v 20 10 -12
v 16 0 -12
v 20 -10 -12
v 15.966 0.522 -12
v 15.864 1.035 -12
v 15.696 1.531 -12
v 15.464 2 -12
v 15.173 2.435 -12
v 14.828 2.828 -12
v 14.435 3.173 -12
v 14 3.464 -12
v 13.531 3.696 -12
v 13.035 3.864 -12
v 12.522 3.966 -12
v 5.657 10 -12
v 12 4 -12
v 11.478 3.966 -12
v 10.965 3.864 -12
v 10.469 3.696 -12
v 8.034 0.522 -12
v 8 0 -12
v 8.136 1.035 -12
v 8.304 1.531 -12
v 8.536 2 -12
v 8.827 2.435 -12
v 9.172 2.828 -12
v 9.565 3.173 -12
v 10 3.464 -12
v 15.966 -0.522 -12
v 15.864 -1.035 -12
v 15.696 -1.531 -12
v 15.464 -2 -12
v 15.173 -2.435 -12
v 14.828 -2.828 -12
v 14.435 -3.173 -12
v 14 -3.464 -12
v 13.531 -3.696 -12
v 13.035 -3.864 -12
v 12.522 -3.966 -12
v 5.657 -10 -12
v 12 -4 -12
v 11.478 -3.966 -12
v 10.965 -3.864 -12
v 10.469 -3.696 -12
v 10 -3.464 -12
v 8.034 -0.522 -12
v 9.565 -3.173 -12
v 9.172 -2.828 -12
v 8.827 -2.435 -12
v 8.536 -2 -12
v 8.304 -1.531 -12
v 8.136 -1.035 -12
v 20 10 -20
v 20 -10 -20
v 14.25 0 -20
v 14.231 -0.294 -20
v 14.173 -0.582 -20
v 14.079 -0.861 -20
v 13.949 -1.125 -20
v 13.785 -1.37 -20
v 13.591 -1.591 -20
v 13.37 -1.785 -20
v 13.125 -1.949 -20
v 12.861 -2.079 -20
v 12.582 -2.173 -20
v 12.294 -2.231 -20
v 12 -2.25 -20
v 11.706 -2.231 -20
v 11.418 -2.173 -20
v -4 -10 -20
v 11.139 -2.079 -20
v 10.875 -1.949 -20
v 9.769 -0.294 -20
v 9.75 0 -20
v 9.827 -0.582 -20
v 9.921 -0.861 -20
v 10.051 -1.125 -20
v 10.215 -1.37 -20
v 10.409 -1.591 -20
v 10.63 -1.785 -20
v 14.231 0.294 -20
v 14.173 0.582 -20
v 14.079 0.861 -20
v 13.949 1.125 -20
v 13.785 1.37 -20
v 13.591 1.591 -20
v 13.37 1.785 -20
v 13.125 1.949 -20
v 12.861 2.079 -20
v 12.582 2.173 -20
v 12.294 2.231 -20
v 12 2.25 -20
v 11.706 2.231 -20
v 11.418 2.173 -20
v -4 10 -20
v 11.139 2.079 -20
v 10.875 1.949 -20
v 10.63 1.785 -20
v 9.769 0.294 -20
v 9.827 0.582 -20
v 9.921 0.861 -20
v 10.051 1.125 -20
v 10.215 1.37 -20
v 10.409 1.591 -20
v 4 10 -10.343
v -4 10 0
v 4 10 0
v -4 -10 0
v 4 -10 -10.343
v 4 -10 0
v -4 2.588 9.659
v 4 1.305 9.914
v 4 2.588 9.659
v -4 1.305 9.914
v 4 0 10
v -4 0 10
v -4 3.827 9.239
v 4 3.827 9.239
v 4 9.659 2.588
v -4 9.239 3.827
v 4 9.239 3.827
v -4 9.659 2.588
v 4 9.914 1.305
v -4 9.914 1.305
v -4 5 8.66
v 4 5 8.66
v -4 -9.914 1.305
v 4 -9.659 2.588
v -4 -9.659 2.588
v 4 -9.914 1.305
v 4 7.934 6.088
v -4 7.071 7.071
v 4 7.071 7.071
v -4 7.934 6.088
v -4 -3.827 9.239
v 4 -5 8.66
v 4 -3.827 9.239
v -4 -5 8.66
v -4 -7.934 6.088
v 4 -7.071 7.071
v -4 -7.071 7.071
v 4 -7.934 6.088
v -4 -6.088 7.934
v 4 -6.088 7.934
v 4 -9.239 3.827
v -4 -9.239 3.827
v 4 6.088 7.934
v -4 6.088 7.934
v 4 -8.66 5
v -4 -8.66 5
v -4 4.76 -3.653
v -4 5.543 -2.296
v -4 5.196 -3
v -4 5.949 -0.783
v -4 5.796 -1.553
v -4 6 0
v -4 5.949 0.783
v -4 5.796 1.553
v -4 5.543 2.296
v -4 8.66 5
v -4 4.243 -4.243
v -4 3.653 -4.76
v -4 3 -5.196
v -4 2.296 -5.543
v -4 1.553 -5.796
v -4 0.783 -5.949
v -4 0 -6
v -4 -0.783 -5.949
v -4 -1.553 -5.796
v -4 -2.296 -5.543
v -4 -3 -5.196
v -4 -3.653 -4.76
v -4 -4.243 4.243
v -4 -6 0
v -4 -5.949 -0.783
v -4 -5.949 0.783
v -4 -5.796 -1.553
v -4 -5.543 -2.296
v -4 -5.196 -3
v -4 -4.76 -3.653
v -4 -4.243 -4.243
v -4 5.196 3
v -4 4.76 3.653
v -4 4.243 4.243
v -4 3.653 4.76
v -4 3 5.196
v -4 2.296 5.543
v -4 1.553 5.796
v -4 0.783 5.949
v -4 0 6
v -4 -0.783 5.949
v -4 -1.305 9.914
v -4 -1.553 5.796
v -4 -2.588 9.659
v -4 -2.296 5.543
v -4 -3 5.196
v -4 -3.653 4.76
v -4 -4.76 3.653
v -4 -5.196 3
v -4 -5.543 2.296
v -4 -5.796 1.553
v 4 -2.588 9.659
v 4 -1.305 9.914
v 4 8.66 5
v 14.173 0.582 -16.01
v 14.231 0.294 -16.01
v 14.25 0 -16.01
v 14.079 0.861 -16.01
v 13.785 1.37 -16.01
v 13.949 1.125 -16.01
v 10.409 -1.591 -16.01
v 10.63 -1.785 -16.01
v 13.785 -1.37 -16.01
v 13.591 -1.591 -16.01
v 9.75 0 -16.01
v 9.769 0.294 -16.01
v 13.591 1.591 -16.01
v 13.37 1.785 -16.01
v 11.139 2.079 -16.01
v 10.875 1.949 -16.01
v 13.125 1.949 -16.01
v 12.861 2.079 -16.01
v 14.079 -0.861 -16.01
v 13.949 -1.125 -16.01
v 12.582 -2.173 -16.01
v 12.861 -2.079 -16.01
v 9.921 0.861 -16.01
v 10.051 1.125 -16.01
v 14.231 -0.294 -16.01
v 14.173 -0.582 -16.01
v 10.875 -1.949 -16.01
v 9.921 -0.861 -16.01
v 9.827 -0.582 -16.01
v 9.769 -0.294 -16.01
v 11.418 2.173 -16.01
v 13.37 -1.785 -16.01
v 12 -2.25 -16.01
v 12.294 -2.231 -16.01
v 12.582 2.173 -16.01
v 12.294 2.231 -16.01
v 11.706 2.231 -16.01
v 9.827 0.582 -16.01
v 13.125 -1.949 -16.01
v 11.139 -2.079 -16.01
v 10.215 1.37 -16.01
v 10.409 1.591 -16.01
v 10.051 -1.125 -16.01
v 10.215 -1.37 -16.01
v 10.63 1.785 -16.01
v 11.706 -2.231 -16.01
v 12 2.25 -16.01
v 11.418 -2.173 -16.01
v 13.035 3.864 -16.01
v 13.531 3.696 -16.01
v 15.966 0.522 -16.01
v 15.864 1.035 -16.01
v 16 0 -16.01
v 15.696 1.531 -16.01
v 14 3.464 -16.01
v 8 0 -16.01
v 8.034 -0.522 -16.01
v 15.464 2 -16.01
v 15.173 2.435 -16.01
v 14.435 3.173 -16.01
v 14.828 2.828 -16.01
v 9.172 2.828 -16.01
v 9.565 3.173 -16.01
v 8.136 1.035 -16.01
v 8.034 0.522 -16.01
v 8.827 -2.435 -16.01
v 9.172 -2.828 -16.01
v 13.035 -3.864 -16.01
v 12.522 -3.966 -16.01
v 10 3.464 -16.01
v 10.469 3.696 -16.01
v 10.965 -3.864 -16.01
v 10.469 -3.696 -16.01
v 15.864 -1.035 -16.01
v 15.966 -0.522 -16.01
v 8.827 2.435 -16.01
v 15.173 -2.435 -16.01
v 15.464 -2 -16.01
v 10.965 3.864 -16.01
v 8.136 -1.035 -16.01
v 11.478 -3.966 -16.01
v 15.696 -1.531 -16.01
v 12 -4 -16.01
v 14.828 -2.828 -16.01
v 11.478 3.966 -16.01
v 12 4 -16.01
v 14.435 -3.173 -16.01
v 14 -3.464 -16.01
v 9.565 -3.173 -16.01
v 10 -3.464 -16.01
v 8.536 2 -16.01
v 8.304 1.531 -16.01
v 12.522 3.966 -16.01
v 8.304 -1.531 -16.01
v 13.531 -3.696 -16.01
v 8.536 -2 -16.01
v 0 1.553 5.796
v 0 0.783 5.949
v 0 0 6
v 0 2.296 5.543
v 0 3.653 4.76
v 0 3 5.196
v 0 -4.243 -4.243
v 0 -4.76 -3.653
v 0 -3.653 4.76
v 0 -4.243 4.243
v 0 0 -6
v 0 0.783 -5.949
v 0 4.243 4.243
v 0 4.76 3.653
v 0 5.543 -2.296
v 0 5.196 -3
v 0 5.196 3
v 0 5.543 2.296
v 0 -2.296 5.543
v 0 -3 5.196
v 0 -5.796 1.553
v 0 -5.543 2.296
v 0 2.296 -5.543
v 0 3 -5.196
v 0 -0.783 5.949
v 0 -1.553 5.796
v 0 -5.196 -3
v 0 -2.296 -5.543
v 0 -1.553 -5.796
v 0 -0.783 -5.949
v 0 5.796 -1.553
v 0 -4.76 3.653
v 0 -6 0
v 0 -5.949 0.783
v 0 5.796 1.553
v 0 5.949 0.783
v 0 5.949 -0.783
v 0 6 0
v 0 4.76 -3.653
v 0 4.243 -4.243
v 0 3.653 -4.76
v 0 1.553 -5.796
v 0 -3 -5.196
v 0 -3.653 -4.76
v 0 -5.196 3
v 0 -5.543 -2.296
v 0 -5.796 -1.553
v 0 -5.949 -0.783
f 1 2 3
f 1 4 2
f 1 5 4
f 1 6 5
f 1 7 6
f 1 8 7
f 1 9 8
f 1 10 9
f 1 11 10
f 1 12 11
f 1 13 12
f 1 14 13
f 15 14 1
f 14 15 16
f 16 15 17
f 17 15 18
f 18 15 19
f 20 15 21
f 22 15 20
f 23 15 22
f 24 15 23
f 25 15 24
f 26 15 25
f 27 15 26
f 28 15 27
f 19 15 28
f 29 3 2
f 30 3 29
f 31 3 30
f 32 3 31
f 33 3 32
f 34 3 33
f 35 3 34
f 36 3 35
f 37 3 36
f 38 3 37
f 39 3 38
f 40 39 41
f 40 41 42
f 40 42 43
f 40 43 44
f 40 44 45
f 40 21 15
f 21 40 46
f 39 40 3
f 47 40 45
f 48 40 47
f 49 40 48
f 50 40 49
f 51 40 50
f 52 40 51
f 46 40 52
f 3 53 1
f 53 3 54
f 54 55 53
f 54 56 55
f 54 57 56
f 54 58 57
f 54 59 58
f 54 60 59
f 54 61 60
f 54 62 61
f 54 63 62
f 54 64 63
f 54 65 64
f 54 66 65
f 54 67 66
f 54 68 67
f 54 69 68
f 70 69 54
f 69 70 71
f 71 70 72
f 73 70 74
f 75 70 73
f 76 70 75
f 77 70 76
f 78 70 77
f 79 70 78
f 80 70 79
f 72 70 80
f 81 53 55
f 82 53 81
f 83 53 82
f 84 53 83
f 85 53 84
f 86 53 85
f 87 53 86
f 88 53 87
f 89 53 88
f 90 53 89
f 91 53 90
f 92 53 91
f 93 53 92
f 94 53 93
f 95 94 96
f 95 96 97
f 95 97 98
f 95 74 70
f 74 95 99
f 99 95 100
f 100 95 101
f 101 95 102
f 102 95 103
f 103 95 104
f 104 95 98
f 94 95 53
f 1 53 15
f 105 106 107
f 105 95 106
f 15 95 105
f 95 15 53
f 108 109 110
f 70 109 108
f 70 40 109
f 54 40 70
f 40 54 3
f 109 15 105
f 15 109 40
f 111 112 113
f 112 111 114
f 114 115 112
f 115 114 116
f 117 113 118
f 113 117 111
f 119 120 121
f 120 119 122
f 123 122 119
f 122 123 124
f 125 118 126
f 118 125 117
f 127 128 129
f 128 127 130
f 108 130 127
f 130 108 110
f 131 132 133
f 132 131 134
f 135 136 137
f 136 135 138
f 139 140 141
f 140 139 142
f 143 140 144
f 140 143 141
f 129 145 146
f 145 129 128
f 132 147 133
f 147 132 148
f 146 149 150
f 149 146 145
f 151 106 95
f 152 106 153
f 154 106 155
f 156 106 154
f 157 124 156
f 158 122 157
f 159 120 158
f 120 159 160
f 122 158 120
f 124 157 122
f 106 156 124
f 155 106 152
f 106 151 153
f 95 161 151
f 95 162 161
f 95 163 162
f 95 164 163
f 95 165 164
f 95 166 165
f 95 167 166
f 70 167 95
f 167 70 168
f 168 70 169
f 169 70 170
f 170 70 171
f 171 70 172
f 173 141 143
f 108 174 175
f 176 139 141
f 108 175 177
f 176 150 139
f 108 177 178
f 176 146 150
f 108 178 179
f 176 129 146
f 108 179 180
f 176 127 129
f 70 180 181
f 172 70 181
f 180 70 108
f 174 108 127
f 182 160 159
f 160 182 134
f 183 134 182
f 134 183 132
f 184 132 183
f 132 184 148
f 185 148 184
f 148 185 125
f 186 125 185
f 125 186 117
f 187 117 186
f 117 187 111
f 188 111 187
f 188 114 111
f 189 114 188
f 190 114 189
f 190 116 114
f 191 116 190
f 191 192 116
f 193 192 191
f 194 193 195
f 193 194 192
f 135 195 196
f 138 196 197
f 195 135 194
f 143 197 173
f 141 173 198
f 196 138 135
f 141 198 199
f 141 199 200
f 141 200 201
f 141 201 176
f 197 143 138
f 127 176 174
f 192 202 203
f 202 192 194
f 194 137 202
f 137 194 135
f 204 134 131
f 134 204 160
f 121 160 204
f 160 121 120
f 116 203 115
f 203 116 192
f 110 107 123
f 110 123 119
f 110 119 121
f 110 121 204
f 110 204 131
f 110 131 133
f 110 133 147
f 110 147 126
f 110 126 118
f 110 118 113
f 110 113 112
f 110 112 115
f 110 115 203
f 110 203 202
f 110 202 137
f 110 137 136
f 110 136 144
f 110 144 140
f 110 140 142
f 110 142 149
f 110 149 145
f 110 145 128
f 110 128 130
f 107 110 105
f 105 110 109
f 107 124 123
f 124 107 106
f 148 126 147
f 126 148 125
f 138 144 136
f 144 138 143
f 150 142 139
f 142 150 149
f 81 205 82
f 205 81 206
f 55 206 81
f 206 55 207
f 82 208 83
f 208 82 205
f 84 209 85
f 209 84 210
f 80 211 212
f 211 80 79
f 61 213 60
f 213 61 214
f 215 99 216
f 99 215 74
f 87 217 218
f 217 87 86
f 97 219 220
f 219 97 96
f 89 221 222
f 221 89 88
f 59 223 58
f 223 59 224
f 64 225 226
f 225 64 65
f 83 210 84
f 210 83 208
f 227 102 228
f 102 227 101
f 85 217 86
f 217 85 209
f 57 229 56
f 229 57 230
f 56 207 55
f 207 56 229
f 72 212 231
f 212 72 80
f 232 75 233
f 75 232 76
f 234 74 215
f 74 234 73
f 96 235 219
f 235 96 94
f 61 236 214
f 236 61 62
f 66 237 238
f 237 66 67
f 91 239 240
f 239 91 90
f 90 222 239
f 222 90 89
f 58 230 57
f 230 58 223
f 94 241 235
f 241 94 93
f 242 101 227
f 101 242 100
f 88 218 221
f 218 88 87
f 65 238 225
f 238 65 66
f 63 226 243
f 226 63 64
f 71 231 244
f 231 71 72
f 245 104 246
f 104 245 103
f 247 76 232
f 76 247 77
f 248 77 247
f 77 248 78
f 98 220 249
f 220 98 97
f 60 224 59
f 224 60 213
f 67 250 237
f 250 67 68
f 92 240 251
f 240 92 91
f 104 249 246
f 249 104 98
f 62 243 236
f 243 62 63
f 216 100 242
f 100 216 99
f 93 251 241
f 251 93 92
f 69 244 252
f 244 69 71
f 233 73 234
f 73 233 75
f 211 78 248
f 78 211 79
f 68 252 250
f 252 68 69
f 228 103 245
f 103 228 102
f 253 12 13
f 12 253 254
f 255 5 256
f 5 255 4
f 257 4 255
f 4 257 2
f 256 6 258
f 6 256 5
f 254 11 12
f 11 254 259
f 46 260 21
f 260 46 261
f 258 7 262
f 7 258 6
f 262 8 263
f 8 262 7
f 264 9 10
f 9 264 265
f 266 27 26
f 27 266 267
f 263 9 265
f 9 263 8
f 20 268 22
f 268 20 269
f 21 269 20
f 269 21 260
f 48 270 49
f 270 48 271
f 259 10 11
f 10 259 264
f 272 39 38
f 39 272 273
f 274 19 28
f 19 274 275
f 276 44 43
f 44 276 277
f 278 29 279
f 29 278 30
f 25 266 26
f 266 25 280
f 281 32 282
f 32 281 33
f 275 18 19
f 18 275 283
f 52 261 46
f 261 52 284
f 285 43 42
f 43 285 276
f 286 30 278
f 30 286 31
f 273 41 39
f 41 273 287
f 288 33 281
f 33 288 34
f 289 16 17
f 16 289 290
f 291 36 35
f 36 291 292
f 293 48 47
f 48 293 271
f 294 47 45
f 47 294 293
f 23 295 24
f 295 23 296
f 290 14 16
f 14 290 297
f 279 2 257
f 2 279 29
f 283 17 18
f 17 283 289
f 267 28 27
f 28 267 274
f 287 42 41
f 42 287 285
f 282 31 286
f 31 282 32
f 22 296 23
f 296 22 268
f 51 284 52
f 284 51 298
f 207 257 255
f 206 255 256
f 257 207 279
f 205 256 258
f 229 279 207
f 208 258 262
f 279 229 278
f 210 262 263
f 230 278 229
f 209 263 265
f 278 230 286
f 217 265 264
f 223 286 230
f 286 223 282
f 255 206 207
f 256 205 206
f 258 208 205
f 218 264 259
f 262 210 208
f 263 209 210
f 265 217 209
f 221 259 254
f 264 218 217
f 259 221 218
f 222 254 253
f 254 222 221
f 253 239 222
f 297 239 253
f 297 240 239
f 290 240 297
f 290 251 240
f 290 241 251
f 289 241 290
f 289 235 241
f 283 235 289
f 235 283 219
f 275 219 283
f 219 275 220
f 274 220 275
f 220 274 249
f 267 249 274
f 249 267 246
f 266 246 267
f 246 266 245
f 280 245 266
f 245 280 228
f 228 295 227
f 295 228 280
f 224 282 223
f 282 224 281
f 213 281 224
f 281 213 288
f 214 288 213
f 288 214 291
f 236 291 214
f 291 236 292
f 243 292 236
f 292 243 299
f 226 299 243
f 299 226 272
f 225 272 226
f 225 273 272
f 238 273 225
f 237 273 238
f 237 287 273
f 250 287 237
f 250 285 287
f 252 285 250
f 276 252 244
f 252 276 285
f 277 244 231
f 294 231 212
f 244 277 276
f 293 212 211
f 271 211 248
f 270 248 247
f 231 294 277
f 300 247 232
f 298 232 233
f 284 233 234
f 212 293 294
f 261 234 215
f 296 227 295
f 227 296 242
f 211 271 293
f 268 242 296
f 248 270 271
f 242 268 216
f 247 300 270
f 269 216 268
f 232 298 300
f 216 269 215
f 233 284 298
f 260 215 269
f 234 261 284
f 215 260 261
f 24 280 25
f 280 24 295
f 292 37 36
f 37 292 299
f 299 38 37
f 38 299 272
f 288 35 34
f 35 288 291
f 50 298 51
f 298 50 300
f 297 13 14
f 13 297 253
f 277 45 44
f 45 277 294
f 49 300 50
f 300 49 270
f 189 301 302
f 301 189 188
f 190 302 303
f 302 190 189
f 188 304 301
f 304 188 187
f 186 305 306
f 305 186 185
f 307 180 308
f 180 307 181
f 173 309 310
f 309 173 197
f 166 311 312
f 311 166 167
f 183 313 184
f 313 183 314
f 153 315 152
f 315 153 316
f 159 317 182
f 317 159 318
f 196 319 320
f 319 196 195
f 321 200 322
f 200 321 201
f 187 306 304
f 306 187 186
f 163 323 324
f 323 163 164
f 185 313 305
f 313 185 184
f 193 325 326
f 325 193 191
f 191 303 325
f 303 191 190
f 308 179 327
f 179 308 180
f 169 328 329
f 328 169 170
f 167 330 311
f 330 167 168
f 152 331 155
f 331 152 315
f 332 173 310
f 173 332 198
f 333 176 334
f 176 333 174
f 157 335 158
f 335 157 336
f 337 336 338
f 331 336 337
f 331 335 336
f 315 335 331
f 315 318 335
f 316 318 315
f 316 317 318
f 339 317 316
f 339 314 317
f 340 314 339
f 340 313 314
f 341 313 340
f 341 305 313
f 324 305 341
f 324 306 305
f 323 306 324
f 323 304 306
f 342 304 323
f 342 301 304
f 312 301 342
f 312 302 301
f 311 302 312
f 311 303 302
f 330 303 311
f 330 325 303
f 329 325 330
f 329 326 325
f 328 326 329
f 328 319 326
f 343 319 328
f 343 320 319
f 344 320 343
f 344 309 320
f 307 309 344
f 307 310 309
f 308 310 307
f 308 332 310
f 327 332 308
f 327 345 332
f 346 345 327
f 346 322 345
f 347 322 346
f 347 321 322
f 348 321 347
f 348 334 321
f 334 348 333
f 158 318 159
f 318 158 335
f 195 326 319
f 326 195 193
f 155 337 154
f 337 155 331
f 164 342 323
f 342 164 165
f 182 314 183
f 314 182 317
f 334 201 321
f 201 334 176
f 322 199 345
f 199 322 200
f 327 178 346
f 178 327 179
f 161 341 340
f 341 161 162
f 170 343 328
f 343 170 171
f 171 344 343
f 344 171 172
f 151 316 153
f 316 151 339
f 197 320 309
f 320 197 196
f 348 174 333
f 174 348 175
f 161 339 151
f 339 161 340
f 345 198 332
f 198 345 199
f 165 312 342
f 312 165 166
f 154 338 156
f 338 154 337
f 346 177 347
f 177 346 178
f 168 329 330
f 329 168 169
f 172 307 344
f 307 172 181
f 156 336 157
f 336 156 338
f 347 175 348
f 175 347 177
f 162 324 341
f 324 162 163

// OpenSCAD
/*Part*/

//Endpiece or centerpiece?
piece = "end"; //[end: endpiece, center: centerpiece]

//Bearing (round) or nut (6-sided)?
hole = "bearing"; //[bearing, nut]

/*Dimensions*/

//Outer bearing / nut diameter (M3: 6.1; M4: 7.8; M5: 8.7; M6: 11.0 ...)
d_bearing = 12;

//Total width
width = 20;

//Thickness (should be 2*bearing/nut thickness for endpiece, 1*bearing/nut thickness for centerpiece)
thickness = 8;

//Fixing screw lower diameter (thread diameter)
M = 4.5;

//Fixing screw upper diameter (screw head dimeter)
M2 = 8.0;



/*Hidden*/
$fn = 48;

echo($fn);

ra = width /2;
ri = d_bearing /2;
hi = thickness /2;

if(piece == "end")
    if(hole == "bearing")
        holder($fn, false);
    else
        holder(6, false);
else 
    if(hole == "bearing"){
        holder($fn, true);
        rotate([0,0,180])
        holder($fn, true);}
    else{
        holder(6, true);
        rotate([0,0,180])
        holder($fn, true);}


module holder(ffn, piece) {
    rotate([0,-90,0])
difference(){
    union(){
        cylinder(h = hi * 2, r = ra, center = true);
        translate([-ra,0,0]) cube([ra*2,ra*2,hi*2], center = true);
        
        translate([-ra*2 + hi,0,-ra]) {
            difference(){
                union(){
                    cube([hi*2,ra*2,ra*2], center = true);
        translate([hi,0,ra])
        rotate([0,45,0])
        cube([hi*2,ra*2,hi*2], center = true);}
        translate([hi,0,ra+hi])
        cube([hi*4,ra*2,hi*2], center = true);
        }}}
    
    cylinder(h = hi*2.001, r = ri, center = piece, $fn = ffn);
        
    translate([-ra*2 - 0.01,0,-ra*1.2])
    rotate([0,90,0])
    
    {cylinder(h = hi*1.01, r = M/2, center = false);
     translate([0,0,hi]) cylinder(h = hi*1.01, r = M2/2, center = false);   
    }   
    }
}
